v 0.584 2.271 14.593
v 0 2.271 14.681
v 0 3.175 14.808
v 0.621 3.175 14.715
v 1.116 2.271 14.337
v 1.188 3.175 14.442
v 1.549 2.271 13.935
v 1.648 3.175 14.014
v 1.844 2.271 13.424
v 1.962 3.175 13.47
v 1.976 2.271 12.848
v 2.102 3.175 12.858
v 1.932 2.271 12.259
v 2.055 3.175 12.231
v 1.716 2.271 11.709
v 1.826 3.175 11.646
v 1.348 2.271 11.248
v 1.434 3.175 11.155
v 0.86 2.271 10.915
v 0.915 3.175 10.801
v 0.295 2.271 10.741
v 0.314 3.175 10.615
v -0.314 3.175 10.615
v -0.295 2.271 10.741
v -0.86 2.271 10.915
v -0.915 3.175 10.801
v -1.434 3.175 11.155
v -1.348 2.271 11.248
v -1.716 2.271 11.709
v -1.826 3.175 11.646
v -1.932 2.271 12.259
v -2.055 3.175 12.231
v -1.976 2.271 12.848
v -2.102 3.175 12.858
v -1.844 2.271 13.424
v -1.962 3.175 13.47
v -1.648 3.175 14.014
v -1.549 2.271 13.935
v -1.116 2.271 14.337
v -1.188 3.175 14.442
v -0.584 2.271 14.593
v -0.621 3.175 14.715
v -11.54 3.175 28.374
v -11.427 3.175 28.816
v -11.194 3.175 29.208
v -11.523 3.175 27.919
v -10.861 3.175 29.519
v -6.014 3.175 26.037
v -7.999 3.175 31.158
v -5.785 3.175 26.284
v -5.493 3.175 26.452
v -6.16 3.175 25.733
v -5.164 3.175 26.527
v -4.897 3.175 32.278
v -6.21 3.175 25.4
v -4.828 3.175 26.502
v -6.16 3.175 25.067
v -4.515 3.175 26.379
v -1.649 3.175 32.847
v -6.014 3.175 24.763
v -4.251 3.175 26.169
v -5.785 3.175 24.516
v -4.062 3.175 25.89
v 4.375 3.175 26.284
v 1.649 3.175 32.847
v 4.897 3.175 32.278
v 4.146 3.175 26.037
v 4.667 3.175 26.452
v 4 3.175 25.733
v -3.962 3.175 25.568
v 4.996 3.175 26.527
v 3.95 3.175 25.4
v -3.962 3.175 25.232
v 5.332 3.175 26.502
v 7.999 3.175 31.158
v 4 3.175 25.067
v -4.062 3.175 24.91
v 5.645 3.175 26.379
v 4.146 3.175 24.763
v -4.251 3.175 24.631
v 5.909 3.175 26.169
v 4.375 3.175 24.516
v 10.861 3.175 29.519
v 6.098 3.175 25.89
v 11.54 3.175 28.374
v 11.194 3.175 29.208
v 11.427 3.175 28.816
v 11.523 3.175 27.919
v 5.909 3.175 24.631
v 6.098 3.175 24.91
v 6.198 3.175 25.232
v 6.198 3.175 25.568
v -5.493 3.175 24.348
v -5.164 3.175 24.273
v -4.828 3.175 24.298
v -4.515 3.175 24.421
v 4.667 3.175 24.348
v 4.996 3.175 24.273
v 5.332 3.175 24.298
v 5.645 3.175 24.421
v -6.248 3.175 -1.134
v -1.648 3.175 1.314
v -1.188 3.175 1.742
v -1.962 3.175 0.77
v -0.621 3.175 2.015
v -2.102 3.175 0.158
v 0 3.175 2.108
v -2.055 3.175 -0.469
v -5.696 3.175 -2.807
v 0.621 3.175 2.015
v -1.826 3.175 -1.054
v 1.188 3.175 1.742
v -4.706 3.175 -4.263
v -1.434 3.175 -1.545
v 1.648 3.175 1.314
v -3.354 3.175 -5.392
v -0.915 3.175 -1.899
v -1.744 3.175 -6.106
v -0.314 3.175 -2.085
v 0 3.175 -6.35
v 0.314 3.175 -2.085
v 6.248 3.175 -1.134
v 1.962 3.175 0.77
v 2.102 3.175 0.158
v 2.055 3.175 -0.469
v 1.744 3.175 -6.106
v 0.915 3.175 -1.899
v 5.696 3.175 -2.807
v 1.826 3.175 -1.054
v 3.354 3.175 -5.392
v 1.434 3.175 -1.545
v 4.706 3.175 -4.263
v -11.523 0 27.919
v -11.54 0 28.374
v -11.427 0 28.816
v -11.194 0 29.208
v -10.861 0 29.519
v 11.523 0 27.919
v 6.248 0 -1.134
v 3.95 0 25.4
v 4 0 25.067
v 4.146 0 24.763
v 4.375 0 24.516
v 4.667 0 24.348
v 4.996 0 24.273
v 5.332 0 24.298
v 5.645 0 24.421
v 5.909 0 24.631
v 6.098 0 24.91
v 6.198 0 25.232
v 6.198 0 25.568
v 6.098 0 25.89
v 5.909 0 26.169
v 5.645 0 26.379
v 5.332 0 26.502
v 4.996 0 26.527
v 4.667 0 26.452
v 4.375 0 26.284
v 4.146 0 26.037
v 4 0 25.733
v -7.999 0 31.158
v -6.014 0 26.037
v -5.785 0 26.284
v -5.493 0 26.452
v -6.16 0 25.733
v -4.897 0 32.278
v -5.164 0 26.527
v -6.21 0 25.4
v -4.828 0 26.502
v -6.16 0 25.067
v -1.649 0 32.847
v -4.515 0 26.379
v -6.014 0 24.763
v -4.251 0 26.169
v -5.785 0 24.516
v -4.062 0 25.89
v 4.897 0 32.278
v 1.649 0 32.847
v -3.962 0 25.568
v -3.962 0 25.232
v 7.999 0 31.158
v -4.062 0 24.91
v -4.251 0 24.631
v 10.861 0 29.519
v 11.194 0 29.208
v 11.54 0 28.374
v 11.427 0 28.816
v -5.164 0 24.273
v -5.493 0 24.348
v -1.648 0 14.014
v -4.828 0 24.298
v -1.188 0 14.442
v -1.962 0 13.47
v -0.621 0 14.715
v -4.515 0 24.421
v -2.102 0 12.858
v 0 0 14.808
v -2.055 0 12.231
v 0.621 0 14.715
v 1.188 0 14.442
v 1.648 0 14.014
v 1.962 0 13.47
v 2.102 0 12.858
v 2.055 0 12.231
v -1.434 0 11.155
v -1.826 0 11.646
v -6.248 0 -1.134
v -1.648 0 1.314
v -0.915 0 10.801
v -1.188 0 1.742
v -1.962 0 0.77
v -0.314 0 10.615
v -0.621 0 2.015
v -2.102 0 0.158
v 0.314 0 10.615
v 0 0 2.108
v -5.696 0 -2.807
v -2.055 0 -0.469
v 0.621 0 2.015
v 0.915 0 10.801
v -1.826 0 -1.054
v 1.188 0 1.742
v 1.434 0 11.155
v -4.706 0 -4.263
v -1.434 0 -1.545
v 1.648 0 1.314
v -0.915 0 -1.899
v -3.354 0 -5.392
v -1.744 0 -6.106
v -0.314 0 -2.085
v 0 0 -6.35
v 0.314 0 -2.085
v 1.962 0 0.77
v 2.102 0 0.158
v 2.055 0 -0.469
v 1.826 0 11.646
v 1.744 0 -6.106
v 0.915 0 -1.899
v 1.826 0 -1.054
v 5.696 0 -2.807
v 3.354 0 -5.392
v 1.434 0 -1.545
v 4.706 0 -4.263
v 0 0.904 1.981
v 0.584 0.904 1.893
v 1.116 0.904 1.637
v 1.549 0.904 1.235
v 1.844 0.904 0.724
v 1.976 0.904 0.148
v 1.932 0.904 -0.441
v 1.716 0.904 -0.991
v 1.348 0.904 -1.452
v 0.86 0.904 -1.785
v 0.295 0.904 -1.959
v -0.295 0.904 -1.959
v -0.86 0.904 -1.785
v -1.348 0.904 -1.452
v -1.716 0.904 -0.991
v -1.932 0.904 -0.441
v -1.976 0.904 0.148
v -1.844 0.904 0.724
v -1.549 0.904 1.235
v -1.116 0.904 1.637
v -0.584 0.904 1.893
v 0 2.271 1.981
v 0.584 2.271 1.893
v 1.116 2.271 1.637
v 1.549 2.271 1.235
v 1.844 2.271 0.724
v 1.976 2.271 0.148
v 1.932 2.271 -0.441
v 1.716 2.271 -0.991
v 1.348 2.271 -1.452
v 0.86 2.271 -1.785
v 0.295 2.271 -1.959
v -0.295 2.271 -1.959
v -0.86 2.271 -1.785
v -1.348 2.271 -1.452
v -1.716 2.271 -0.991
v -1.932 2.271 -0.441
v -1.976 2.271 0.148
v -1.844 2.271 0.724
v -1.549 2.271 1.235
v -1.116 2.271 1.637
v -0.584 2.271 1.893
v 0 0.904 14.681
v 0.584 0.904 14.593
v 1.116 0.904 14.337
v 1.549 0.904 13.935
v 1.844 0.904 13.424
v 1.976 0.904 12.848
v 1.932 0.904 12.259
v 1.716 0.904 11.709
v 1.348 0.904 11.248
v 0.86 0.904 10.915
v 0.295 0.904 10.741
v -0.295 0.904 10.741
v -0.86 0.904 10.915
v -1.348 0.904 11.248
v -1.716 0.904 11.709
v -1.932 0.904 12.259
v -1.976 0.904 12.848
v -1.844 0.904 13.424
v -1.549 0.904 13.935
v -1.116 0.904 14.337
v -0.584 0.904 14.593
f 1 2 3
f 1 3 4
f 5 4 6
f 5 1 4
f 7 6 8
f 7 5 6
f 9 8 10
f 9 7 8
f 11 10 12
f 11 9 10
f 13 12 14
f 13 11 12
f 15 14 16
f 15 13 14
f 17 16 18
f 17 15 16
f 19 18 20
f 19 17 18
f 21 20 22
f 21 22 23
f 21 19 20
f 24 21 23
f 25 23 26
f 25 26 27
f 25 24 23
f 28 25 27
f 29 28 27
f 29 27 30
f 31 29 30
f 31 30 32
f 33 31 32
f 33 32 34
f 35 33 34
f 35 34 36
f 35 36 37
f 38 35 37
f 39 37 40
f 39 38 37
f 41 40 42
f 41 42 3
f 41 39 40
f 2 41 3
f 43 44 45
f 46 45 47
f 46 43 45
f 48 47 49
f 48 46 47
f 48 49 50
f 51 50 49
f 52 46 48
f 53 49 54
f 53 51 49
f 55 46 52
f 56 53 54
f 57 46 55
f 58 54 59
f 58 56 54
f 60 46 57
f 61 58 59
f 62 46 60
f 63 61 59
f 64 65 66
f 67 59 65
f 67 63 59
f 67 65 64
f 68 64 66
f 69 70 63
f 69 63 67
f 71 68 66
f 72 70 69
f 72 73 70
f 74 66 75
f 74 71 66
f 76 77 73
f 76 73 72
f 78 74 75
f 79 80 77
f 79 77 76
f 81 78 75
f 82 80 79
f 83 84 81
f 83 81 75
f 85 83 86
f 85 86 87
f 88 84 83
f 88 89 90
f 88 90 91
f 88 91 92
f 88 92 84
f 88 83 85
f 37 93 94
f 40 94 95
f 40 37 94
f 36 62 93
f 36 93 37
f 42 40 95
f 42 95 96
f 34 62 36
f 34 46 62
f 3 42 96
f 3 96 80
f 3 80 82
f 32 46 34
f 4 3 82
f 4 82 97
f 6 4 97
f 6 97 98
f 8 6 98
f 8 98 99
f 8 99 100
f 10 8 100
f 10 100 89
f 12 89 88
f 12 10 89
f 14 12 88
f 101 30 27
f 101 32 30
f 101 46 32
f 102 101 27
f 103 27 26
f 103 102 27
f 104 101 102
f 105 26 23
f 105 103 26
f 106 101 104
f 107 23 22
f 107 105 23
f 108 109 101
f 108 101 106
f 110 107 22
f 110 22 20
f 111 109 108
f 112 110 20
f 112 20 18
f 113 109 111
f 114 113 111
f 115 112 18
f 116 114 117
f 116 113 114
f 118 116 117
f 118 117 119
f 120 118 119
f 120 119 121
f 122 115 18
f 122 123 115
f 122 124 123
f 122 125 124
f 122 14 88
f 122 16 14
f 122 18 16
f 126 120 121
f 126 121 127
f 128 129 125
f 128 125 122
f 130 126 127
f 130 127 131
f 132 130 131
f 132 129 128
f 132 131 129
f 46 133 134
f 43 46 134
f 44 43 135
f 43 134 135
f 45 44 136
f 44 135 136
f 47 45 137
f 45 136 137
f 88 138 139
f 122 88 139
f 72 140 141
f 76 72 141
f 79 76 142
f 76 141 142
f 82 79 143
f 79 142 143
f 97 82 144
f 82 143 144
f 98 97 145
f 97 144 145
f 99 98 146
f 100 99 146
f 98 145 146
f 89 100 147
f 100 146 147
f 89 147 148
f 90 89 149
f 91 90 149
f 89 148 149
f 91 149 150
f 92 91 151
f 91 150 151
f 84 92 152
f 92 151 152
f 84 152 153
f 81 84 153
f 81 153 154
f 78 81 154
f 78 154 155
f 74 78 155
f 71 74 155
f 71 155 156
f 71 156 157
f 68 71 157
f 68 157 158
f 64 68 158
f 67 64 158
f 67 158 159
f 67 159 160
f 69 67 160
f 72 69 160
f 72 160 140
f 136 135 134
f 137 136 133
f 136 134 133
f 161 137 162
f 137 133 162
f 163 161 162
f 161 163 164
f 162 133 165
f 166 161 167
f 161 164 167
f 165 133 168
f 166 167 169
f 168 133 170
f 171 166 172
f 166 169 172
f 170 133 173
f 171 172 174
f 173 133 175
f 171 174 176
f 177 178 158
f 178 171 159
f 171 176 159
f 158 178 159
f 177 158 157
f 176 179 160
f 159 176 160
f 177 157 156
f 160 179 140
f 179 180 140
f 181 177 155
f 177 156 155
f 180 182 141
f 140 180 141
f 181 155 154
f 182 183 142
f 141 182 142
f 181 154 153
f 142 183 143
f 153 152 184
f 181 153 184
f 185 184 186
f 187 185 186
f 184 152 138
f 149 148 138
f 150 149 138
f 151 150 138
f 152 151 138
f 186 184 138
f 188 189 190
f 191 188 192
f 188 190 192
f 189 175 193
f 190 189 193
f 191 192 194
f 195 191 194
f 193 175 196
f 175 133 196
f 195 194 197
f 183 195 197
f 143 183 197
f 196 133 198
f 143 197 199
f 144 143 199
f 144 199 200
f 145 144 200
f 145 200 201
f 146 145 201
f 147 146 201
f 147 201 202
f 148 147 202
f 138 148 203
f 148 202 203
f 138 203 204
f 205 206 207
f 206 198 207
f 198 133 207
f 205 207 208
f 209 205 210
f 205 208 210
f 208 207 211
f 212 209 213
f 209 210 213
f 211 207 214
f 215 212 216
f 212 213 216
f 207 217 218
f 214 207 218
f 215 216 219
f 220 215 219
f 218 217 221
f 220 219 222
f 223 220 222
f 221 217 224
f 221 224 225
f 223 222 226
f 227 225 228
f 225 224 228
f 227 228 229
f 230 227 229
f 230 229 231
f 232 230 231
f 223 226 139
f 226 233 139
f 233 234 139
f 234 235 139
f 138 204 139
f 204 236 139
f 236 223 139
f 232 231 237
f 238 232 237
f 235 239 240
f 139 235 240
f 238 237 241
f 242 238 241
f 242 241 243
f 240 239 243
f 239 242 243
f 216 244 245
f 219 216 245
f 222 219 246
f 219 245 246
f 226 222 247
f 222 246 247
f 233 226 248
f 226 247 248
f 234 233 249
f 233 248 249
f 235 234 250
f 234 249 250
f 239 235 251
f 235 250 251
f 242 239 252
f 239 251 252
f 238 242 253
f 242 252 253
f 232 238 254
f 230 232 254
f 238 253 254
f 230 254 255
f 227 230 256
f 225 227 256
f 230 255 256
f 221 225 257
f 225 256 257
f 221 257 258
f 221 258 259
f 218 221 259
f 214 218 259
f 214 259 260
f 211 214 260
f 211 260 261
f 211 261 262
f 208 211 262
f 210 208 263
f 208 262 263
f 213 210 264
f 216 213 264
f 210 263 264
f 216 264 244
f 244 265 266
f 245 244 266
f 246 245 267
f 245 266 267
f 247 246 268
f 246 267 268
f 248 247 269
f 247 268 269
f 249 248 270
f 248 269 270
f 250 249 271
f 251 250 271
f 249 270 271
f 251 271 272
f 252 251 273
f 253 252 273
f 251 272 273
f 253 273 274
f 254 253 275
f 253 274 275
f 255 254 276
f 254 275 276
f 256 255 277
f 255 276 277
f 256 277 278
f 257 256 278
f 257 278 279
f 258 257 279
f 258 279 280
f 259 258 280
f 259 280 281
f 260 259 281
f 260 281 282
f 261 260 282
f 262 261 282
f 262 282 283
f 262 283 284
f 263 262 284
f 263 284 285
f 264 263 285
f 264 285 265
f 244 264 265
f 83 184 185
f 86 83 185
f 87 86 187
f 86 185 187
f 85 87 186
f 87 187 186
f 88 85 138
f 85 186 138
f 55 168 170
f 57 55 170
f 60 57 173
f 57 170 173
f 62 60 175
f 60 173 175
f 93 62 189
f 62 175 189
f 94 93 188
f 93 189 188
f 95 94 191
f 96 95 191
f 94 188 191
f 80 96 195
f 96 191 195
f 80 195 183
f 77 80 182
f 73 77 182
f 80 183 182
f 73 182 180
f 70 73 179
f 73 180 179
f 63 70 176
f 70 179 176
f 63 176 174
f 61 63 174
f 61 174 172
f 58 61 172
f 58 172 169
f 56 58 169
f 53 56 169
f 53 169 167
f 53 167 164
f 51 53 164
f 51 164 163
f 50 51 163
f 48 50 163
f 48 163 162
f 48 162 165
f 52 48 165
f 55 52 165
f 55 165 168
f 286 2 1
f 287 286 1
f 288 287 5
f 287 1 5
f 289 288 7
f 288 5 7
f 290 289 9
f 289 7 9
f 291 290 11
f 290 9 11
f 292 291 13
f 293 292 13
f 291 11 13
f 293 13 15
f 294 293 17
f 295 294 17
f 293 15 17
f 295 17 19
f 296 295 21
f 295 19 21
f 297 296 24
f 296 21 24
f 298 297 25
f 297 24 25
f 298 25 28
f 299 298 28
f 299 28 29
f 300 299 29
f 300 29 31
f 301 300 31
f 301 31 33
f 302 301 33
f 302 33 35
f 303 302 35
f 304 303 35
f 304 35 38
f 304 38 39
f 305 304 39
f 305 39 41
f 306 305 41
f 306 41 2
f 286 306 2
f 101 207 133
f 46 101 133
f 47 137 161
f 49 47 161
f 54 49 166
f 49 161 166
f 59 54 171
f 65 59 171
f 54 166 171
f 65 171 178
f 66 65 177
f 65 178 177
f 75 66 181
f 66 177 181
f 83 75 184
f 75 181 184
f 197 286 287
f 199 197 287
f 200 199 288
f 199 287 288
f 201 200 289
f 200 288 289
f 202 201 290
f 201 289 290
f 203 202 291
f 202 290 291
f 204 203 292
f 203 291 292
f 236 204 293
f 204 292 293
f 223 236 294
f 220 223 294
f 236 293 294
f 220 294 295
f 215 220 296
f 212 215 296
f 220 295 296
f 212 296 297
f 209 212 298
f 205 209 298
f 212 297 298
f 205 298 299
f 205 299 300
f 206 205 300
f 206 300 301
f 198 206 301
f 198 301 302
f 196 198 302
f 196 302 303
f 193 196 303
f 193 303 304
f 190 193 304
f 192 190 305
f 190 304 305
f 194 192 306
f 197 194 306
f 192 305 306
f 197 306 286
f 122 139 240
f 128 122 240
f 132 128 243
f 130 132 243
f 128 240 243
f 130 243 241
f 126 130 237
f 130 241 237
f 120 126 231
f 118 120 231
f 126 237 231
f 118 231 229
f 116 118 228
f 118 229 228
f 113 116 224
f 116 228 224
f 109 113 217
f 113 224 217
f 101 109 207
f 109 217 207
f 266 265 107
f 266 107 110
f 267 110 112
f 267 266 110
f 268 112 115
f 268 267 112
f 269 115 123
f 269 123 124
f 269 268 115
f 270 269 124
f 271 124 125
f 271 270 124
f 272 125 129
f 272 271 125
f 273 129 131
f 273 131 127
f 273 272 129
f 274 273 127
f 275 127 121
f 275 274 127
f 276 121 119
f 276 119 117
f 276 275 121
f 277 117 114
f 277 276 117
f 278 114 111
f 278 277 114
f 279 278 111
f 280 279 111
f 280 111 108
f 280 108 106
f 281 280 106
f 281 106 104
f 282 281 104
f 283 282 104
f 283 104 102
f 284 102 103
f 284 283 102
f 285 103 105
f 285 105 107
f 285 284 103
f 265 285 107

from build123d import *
from OCP.BRepFilletAPI import BRepFilletAPI_MakeChamfer

# Parameters (mm, degrees)
BOSS_EXTRUDE1_DEPTH   = 3.175
F_4_40_TAPPED_HOLE1_D = 2.2606
CUT_EXTRUDE1_REACH    = 37.03
SKETCH3_R             = 1.9812
CHAMFER1_SIZE         = 0.127
CHAMFER1_SIZE2        = 0.903651955


with BuildPart() as part:
    # Sketch2 → Boss-Extrude1 (new body)
    with BuildSketch(Plane(origin=(0, 0, 0), x_dir=(1, 0, 0), z_dir=(0, 1, 0))):
        with BuildLine():
            Line((-6.247852156, 1.134391221), (-11.522869846, -27.918663873))
            ThreePointArc((-11.522869846, -27.918663873), (-11.4270655, -28.816266687), (-10.860710811, -29.519197446))
            ThreePointArc((-10.860710811, -29.519197446), (0, -32.9184), (10.860710811, -29.519197446))
            ThreePointArc((10.860710811, -29.519197446), (11.4270655, -28.816266687), (11.522869846, -27.918663873))
            Line((11.522869846, -27.918663873), (6.247852156, 1.134391221))
            ThreePointArc((6.247852156, 1.134391221), (0, 6.35), (-6.247852156, 1.134391221))
        make_face()
    extrude(amount=BOSS_EXTRUDE1_DEPTH)

    # #4-40 Tapped Hole1 (through all)
    with Locations(Plane(origin=(0, 3.175, 0), x_dir=(1, 0, 0), z_dir=(0, 1, 0))):
        with Locations((-5.08, -25.4), (5.08, -25.4)):
            Hole(F_4_40_TAPPED_HOLE1_D / 2)

    # Sketch3 → Cut-Extrude1 (cut, up to next)
    with BuildSketch(Plane(origin=(0, 3.175, 0), x_dir=(1, 0, 0), z_dir=(0, 1, 0)), mode=Mode.PRIVATE) as cut_extrude1_sk1:
        with Locations(Location((0, 0, 0), (0, 0, 270))):
            Circle(SKETCH3_R)
    cut_extrude1_tool1 = extrude(cut_extrude1_sk1.sketch, amount=-CUT_EXTRUDE1_REACH, mode=Mode.PRIVATE) & part.part
    # Sketch3 → Cut-Extrude1 (cut, up to next)
    with BuildSketch(Plane(origin=(0, 3.175, 0), x_dir=(1, 0, 0), z_dir=(0, 1, 0)), mode=Mode.PRIVATE) as cut_extrude1_sk2:
        with Locations(Location((0, -12.7, 0), (0, 0, 270))):
            Circle(SKETCH3_R)
    cut_extrude1_tool2 = extrude(cut_extrude1_sk2.sketch, amount=-CUT_EXTRUDE1_REACH, mode=Mode.PRIVATE) & part.part
    add(cut_extrude1_tool1.solids().sort_by_distance((0, 3.175, 0))[0], mode=Mode.SUBTRACT)
    add(cut_extrude1_tool2.solids().sort_by_distance((0, 3.175, 12.7))[0], mode=Mode.SUBTRACT)

    # Chamfer1: one chamfer whose edges measure the first distance from different faces: ONE call of the kernel's chamfer builder (chamfer() names one face for all edges)
    chamfer1_edges_1 = [part.edges().sort_by_distance(p)[0] for p in [
        (0, 3.175, -1.9812),
        (0, 3.175, 10.7188),
    ]]
    chamfer1_side_1 = [part.faces().sort_by_distance(p)[0] for p in [
        (0, 3.175, 15.711859533),
    ]]
    chamfer1_edges_2 = [part.edges().sort_by_distance(p)[0] for p in [
        (0, 0, -1.9812),
        (0, 0, 10.7188),
    ]]
    chamfer1_side_2 = [part.faces().sort_by_distance(p)[0] for p in [
        (0, 0, 15.711859533),
    ]]
    chamfer1 = BRepFilletAPI_MakeChamfer(part.part.solid().wrapped)
    for e in chamfer1_edges_1:
        chamfer1.Add(CHAMFER1_SIZE, CHAMFER1_SIZE2, e.wrapped, chamfer1_side_1[0].wrapped)  # the first distance lies on this face
    for e in chamfer1_edges_2:
        chamfer1.Add(CHAMFER1_SIZE, CHAMFER1_SIZE2, e.wrapped, chamfer1_side_2[0].wrapped)  # the first distance lies on this face
    add(Compound.cast(chamfer1.Shape()), mode=Mode.REPLACE)


solid = part.part
